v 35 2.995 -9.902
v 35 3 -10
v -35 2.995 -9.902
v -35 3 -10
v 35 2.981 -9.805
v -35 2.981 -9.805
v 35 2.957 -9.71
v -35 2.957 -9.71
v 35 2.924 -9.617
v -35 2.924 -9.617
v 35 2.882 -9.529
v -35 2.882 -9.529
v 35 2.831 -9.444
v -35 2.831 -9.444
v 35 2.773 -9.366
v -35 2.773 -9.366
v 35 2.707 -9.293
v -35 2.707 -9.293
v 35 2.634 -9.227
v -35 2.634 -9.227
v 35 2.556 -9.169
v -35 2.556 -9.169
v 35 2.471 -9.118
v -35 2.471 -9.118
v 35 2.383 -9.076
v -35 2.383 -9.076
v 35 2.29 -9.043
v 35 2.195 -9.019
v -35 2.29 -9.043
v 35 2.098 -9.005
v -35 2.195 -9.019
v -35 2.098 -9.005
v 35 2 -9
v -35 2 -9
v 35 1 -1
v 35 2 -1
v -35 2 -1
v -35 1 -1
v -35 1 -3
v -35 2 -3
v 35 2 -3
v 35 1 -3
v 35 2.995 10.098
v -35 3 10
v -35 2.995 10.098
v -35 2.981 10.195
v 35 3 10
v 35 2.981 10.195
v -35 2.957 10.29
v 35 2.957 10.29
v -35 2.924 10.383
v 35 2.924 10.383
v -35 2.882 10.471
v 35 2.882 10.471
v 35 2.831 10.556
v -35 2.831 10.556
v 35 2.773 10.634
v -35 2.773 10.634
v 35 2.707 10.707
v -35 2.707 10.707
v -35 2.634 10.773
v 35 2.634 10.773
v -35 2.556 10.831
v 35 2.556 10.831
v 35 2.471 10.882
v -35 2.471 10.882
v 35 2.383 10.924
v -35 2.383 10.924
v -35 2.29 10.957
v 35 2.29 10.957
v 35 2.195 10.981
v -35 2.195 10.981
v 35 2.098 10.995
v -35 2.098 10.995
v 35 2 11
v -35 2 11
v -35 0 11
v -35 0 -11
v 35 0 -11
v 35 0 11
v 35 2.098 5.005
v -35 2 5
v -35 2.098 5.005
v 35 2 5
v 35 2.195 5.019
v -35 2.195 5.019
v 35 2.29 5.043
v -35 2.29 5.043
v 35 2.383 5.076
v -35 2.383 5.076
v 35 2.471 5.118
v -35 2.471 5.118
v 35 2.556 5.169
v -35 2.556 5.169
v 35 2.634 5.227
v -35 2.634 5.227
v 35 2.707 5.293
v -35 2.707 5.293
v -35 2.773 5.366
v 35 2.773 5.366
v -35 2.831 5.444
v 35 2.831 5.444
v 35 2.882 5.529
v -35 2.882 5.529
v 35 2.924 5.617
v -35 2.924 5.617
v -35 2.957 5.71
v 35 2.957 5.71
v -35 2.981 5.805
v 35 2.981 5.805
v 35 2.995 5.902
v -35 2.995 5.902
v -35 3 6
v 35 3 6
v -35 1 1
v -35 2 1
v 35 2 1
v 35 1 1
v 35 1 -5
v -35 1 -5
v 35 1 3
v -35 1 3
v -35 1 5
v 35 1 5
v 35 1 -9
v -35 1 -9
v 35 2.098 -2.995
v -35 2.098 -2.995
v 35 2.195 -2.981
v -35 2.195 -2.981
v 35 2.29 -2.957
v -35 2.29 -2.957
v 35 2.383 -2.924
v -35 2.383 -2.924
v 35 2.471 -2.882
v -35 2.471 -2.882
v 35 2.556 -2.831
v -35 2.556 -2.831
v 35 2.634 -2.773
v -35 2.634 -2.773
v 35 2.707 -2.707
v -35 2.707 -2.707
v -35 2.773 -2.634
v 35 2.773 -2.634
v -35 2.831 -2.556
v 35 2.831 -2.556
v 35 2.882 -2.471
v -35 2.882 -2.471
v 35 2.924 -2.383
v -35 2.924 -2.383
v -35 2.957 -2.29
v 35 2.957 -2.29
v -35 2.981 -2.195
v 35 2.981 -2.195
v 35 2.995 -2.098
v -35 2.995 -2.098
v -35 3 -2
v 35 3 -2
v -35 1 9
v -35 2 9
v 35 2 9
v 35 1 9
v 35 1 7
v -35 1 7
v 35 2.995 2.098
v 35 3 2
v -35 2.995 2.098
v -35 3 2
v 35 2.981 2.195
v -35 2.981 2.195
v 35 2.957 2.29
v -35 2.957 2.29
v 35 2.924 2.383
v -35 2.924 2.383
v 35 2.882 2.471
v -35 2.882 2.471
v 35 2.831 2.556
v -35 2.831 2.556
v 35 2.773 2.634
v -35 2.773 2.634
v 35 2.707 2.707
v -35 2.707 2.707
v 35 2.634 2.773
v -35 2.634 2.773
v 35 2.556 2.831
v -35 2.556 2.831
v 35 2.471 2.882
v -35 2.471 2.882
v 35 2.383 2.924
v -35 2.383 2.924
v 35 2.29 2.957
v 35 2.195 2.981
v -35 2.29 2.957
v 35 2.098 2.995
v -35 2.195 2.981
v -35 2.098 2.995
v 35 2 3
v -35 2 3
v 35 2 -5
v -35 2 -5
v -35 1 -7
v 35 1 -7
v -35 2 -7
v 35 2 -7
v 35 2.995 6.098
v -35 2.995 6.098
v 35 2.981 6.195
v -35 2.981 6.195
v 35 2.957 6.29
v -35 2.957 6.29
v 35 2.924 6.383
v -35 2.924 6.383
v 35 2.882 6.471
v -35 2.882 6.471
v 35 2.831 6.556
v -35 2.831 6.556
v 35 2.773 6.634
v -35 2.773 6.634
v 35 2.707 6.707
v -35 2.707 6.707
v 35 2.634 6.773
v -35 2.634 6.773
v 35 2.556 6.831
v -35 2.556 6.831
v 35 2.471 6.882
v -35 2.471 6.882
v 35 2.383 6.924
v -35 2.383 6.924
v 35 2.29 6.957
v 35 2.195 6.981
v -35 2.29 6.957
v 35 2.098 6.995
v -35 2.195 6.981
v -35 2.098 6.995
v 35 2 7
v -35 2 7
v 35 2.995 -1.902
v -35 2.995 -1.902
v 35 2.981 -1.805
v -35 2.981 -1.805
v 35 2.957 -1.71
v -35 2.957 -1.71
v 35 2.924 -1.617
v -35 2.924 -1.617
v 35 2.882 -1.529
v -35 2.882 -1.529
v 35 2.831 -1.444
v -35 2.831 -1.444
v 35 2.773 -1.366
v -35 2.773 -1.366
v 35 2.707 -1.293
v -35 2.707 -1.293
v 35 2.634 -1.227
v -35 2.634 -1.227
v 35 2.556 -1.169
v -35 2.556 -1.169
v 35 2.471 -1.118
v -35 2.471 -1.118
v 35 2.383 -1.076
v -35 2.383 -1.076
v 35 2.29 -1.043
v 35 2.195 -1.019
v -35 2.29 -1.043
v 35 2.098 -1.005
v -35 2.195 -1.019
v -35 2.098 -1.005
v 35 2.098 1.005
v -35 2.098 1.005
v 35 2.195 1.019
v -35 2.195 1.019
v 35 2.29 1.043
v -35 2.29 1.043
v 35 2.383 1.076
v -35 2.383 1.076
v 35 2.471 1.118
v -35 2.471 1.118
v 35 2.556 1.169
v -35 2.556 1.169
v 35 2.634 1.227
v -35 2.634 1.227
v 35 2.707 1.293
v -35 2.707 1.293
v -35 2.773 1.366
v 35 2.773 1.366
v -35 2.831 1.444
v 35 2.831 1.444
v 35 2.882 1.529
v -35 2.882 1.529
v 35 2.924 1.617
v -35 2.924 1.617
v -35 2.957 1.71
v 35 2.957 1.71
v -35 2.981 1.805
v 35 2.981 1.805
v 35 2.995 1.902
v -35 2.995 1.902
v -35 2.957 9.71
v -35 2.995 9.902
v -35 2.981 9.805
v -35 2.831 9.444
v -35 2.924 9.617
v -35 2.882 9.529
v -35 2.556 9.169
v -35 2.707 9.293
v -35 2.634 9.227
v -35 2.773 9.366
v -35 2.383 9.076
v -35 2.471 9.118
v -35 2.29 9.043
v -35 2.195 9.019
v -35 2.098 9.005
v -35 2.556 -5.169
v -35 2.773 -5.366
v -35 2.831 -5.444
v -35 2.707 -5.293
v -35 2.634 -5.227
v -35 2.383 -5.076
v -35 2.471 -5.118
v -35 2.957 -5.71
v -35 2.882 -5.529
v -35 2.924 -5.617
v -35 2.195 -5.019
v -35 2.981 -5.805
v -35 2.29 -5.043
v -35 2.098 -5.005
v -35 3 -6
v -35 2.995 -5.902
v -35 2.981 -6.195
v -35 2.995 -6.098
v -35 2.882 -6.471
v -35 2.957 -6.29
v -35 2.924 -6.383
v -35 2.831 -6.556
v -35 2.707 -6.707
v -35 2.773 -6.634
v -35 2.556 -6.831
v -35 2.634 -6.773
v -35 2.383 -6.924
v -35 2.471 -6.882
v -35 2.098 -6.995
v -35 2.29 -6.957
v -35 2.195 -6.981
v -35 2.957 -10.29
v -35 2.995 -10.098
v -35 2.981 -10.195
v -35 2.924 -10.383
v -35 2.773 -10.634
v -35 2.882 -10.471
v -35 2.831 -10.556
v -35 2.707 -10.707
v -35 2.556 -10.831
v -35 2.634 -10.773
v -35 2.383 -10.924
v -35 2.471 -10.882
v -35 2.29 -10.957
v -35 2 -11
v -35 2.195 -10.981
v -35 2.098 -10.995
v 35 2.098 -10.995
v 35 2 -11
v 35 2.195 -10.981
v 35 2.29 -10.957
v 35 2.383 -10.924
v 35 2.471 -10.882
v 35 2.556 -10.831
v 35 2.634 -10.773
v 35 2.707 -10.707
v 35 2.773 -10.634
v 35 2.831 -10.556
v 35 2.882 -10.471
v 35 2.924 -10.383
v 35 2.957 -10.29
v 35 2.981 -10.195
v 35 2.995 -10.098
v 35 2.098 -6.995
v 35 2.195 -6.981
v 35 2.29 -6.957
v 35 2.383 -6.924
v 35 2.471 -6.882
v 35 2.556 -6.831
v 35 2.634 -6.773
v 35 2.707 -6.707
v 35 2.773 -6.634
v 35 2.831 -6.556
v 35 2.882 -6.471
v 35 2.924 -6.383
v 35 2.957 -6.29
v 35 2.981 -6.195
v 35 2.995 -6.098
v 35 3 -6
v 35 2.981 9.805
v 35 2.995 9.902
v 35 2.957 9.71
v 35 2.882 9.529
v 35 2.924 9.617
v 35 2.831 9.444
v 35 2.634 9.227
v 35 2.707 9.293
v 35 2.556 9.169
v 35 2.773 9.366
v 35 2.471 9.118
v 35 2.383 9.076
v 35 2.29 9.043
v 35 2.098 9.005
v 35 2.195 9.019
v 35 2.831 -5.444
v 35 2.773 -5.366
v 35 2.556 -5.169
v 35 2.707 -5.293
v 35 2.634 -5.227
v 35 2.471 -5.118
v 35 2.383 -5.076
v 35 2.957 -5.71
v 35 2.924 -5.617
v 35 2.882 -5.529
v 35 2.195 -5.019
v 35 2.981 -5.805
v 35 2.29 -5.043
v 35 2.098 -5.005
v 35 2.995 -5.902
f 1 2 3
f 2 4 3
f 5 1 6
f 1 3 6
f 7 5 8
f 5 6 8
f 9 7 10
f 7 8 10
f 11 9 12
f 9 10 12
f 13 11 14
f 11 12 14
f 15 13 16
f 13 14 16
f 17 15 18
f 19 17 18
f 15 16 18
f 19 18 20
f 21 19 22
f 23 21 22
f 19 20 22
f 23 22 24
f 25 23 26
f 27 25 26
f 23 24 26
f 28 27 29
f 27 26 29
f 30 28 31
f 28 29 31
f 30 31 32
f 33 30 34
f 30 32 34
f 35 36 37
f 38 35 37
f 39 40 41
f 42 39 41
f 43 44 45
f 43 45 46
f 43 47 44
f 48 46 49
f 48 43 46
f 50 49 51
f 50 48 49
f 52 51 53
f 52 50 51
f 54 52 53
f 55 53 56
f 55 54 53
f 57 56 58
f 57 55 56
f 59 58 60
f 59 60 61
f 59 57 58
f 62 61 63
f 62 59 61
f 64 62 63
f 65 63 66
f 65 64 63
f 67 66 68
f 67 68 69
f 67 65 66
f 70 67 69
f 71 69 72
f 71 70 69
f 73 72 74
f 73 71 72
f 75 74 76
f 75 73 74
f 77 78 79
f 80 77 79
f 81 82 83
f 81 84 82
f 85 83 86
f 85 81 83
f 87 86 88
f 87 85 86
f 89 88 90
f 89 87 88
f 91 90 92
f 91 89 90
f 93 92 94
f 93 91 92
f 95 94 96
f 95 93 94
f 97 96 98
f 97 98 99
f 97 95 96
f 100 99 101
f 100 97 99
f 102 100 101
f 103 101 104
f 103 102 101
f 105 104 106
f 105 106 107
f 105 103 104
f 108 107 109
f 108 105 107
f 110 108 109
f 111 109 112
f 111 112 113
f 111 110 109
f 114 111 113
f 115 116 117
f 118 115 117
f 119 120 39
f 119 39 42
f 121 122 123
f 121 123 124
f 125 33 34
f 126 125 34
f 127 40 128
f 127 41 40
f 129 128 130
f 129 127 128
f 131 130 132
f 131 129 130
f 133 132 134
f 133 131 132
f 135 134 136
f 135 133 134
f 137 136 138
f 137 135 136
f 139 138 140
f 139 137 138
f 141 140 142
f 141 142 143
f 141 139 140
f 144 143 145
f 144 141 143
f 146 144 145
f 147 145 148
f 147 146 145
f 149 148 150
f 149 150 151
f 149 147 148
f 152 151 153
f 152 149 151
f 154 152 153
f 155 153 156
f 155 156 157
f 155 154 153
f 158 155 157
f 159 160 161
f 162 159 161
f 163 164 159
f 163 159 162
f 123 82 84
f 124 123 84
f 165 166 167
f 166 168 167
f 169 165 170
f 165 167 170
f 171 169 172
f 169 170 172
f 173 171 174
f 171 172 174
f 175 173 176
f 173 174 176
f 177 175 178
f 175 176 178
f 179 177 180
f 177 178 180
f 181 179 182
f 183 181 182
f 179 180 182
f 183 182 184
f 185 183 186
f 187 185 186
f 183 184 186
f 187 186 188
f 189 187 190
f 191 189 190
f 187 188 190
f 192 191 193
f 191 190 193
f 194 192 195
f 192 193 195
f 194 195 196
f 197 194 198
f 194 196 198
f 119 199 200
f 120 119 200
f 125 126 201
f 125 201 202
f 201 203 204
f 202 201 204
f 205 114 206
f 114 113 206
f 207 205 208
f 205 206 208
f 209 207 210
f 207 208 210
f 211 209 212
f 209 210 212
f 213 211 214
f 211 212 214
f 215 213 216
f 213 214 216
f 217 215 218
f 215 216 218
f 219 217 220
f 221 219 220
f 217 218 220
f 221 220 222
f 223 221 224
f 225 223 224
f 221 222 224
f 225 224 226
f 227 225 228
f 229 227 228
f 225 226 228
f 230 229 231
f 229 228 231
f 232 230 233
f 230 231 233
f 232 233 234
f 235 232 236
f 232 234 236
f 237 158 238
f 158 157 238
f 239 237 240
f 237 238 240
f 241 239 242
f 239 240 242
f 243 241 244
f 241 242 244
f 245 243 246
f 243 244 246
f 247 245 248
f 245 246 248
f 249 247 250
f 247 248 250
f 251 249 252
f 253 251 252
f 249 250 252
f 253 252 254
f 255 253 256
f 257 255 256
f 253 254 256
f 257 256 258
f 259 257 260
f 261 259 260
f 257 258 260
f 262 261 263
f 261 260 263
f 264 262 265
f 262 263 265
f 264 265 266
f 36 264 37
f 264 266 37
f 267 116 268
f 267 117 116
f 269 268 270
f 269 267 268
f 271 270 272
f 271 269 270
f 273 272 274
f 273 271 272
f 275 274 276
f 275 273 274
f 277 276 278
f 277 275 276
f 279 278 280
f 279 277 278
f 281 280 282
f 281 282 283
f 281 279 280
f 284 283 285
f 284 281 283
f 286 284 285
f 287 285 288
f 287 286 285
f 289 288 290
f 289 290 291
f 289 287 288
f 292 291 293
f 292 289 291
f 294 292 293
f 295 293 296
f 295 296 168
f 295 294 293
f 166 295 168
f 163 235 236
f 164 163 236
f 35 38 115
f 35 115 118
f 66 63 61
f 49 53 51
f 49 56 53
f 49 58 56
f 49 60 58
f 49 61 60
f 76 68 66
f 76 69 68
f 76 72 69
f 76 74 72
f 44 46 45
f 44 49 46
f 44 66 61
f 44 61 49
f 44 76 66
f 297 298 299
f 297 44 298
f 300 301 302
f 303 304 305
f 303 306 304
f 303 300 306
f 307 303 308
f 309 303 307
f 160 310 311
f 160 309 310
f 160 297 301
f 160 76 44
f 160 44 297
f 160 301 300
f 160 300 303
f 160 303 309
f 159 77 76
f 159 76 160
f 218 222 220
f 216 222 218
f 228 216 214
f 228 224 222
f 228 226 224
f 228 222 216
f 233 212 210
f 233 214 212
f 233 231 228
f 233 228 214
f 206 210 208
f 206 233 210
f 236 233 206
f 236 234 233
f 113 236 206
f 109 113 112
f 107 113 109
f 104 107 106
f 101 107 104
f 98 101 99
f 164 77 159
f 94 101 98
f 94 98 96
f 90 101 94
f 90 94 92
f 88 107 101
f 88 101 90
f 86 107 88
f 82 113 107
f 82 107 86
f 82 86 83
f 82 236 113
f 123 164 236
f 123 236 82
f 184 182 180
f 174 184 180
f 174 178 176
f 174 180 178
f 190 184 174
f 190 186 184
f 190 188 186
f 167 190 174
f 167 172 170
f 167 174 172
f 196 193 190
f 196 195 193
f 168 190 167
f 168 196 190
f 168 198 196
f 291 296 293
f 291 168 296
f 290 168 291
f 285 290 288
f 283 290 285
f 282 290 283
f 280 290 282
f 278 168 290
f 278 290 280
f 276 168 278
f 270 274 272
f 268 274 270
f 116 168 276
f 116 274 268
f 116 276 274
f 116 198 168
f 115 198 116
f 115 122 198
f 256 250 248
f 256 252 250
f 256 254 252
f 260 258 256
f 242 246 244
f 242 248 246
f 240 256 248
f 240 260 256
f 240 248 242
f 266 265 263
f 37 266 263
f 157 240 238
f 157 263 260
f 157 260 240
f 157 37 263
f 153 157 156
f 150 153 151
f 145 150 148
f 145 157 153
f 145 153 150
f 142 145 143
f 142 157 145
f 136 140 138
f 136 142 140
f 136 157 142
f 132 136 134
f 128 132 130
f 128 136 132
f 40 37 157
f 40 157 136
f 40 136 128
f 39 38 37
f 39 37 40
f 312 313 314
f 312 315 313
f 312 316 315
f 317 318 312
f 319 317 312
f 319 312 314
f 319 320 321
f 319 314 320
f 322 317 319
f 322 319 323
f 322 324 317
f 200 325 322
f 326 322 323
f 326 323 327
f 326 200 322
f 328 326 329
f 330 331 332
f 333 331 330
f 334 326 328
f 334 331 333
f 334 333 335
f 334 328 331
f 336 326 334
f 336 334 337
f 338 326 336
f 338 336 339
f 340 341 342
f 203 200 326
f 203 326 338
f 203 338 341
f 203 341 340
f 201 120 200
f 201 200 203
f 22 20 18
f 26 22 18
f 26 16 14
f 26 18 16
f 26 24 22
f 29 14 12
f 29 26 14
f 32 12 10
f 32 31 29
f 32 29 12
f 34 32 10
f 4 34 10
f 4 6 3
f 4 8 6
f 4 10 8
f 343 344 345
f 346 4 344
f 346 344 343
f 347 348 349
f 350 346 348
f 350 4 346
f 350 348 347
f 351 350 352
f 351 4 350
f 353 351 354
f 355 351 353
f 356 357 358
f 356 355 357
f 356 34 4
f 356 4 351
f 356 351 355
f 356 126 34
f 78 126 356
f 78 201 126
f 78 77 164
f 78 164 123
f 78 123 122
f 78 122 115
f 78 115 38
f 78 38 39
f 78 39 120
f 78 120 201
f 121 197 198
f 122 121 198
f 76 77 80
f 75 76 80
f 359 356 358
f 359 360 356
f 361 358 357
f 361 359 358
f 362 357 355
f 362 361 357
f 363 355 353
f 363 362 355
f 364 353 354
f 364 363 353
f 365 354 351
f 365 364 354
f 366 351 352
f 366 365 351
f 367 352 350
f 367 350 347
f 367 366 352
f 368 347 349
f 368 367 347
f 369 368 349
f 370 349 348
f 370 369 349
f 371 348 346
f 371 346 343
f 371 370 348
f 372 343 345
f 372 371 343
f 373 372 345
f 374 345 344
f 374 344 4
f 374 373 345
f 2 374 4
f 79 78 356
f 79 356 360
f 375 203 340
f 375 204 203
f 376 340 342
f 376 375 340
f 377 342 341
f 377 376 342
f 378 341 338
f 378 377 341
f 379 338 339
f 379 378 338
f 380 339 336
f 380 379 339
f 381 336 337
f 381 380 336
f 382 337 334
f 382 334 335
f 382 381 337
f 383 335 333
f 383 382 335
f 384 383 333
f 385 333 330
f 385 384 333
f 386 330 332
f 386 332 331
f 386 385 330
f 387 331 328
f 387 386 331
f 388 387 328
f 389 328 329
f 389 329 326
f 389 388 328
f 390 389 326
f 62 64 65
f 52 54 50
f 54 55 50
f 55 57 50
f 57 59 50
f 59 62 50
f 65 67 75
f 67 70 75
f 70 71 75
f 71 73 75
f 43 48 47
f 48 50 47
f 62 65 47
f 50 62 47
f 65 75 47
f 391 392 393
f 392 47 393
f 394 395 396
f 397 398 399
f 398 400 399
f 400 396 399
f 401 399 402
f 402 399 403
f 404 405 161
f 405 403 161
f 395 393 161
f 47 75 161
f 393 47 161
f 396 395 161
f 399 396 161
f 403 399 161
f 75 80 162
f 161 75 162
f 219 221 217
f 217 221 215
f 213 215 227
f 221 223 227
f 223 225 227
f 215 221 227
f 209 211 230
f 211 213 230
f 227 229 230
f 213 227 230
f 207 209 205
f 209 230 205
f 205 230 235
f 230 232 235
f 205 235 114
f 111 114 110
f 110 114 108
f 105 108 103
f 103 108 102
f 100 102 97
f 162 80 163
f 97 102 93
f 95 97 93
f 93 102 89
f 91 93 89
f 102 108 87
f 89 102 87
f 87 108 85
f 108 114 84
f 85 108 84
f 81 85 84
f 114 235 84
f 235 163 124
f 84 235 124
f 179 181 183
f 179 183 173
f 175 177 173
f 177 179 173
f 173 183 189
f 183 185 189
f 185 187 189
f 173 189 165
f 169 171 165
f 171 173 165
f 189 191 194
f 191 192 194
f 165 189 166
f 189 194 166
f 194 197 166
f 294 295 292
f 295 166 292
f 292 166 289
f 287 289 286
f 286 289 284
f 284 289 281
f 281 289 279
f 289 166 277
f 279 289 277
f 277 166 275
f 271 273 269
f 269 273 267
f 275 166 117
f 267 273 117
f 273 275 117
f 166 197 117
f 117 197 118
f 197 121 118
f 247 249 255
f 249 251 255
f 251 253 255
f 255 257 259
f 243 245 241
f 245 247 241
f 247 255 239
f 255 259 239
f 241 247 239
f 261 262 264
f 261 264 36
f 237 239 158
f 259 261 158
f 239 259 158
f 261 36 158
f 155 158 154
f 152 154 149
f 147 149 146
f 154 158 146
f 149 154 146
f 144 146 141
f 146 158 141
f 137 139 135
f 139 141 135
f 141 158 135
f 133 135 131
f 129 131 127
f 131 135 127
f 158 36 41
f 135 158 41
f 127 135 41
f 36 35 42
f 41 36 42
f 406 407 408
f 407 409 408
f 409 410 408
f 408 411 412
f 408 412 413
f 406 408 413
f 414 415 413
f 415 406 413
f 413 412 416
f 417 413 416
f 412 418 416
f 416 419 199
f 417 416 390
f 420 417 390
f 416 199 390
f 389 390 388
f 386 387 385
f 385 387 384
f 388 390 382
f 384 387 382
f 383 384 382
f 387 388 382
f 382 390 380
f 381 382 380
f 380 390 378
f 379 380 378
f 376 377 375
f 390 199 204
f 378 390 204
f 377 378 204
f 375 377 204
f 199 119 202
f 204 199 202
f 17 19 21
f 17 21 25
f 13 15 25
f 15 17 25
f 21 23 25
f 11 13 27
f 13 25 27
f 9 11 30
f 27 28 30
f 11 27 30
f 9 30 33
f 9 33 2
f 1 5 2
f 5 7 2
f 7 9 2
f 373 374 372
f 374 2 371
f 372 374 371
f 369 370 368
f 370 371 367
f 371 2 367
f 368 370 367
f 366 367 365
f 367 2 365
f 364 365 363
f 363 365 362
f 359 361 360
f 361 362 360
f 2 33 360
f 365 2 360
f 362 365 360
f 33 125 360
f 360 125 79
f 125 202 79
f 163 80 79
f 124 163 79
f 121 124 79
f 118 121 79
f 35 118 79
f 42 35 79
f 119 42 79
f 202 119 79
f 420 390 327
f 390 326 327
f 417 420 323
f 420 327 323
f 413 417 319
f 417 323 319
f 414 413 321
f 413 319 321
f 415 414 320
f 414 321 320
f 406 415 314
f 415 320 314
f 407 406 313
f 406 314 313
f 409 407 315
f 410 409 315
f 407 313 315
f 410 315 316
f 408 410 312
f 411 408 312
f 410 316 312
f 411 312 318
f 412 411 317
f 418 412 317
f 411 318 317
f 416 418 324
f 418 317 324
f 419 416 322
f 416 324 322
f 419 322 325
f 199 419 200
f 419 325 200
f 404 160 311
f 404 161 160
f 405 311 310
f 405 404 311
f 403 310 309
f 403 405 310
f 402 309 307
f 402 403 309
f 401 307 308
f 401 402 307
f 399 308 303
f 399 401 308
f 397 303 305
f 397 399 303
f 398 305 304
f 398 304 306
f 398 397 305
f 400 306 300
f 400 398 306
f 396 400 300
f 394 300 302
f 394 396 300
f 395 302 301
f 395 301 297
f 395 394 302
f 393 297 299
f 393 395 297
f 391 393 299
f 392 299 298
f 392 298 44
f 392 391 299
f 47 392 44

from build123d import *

# Parameters (mm, degrees)
SKETCH_1_W          = 70
SKETCH_1_H          = 22
EXTRUDE_1_DEPTH     = 3
SKETCH_2_W          = 35
SKETCH_2_H          = 2
CUT_EXTRUDE_1_DEPTH = 2
FILLET_1_R          = 1


with BuildPart() as part:
    # 草图1 → 凸台-拉伸1 (new body)
    with BuildSketch(Plane(origin=(0, 0, 0), x_dir=(1, 0, 0), z_dir=(0, 1, 0))):
        Rectangle(SKETCH_1_W, SKETCH_1_H)
    extrude(amount=EXTRUDE_1_DEPTH)

    # 草图2 → 切除-拉伸1 (cut)
    with BuildSketch(Plane(origin=(0, 3, 0), x_dir=(1, 0, 0), z_dir=(0, 1, 0))):
        with Locations((17.5, -8)):
            Rectangle(SKETCH_2_W, SKETCH_2_H)
        with Locations((-17.5, -8)):
            Rectangle(SKETCH_2_W, SKETCH_2_H)
        with Locations((-17.5, -4)):
            Rectangle(SKETCH_2_W, SKETCH_2_H)
        with Locations((17.5, -4)):
            Rectangle(SKETCH_2_W, SKETCH_2_H)
        with Locations((17.5, 0)):
            Rectangle(SKETCH_2_W, SKETCH_2_H)
        with Locations((-17.5, 0)):
            Rectangle(SKETCH_2_W, SKETCH_2_H)
        with Locations((-17.5, 4)):
            Rectangle(SKETCH_2_W, SKETCH_2_H)
        with Locations((17.5, 4)):
            Rectangle(SKETCH_2_W, SKETCH_2_H)
        with Locations((17.5, 8)):
            Rectangle(SKETCH_2_W, SKETCH_2_H)
        with Locations((-17.5, 8)):
            Rectangle(SKETCH_2_W, SKETCH_2_H)
    extrude(amount=-CUT_EXTRUDE_1_DEPTH, mode=Mode.SUBTRACT)

    # 圆角1
    fillet_1_edges = [part.edges().sort_by_distance(p)[0] for p in [
        (0, 3, 11),
        (0, 3, 9),
        (0, 3, 7),
        (0, 3, 5),
        (0, 3, 3),
        (0, 3, 1),
        (0, 3, -1),
        (0, 3, -3),
        (0, 3, -5),
        (0, 3, -7),
        (0, 3, -9),
        (0, 3, -11),
    ]]
    fillet(fillet_1_edges, radius=FILLET_1_R - 0.0001)  # a hair under: the kernel refuses the full size


solid = part.part
